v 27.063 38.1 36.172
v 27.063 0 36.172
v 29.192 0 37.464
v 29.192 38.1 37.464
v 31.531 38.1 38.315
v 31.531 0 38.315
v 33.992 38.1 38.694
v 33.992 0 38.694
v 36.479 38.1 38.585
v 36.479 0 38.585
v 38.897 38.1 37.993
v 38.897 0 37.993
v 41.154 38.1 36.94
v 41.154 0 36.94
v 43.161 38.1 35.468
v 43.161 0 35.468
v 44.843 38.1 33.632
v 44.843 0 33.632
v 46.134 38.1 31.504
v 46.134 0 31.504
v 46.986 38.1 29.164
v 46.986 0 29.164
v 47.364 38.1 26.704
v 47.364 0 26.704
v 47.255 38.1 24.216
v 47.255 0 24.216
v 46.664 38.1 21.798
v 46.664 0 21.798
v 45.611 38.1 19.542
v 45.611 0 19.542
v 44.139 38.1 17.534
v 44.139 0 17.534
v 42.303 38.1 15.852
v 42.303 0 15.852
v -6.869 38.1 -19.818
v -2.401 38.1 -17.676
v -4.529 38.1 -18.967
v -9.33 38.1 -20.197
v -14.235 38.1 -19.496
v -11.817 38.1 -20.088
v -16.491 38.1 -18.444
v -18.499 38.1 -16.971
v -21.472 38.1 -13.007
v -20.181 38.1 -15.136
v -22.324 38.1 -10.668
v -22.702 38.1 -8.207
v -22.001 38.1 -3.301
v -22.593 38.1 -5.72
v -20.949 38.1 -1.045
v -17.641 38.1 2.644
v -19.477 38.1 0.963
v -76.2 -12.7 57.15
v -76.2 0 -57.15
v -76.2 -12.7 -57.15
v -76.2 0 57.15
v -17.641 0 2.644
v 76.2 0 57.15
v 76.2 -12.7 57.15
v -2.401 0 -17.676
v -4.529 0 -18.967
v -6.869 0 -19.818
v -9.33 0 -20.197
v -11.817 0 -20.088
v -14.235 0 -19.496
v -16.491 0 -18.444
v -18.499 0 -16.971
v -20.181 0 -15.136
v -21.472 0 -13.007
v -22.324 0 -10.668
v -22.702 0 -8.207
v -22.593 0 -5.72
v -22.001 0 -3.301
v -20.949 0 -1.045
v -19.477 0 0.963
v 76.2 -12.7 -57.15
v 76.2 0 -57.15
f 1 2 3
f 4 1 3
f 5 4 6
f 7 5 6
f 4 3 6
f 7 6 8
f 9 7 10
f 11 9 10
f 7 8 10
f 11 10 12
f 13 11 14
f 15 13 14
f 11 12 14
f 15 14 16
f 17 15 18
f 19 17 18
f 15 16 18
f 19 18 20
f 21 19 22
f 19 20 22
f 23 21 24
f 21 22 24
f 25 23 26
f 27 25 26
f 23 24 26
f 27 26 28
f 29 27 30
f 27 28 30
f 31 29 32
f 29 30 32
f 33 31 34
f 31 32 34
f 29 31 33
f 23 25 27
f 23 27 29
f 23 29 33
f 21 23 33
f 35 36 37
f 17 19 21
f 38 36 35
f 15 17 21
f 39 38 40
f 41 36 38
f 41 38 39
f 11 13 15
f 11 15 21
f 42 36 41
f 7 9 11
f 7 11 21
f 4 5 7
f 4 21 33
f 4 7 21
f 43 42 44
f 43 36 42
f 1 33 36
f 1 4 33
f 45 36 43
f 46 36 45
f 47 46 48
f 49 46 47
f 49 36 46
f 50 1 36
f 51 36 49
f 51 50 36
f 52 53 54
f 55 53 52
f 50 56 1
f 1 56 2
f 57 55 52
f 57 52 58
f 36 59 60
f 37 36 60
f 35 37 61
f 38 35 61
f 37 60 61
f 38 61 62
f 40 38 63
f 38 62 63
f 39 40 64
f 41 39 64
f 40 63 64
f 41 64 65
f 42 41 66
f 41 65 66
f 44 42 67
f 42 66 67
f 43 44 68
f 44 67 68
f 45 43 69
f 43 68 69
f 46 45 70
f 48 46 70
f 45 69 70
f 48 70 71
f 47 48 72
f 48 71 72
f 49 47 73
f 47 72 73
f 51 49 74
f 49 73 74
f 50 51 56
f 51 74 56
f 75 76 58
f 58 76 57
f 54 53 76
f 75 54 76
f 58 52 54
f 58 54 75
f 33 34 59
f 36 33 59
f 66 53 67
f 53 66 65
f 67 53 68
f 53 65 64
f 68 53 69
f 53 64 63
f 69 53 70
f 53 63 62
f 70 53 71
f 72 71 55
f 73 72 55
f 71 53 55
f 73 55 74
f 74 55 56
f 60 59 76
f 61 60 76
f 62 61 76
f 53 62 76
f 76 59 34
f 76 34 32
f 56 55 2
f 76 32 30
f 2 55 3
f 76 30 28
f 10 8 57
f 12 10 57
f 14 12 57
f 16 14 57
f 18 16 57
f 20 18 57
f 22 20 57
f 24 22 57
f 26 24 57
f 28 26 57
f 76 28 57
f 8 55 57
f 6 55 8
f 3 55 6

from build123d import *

# Parameters (mm, degrees)
F0_W     = 152.4
F0_H     = 114.3
F1_DEPTH = 12.7
F3_DEPTH = 38.1


with BuildPart() as f1:
    # F0 (on Front) → F1 (new body)
    with BuildSketch(Plane.XZ):
        Rectangle(F0_W, F0_H)
    extrude(amount=F1_DEPTH)

    # F2 (on face) → F3 (join)
    with BuildSketch(Plane(origin=(0, 0, 0), x_dir=(-1, 0, 0), z_dir=(0, 1, 0))):
        with BuildLine():
            Line((-42.303127, 15.852345), (2.400873, -17.675655))
            ThreePointArc((2.400873, -17.675655), (20.180873, -15.135655), (17.640873, 2.644345))
            Line((17.640873, 2.644345), (-27.063127, 36.172345))
            ThreePointArc((-27.063127, 36.172345), (-44.843127, 33.632345), (-42.303127, 15.852345))
        make_face()
    extrude(amount=F3_DEPTH)


solid = f1.part
